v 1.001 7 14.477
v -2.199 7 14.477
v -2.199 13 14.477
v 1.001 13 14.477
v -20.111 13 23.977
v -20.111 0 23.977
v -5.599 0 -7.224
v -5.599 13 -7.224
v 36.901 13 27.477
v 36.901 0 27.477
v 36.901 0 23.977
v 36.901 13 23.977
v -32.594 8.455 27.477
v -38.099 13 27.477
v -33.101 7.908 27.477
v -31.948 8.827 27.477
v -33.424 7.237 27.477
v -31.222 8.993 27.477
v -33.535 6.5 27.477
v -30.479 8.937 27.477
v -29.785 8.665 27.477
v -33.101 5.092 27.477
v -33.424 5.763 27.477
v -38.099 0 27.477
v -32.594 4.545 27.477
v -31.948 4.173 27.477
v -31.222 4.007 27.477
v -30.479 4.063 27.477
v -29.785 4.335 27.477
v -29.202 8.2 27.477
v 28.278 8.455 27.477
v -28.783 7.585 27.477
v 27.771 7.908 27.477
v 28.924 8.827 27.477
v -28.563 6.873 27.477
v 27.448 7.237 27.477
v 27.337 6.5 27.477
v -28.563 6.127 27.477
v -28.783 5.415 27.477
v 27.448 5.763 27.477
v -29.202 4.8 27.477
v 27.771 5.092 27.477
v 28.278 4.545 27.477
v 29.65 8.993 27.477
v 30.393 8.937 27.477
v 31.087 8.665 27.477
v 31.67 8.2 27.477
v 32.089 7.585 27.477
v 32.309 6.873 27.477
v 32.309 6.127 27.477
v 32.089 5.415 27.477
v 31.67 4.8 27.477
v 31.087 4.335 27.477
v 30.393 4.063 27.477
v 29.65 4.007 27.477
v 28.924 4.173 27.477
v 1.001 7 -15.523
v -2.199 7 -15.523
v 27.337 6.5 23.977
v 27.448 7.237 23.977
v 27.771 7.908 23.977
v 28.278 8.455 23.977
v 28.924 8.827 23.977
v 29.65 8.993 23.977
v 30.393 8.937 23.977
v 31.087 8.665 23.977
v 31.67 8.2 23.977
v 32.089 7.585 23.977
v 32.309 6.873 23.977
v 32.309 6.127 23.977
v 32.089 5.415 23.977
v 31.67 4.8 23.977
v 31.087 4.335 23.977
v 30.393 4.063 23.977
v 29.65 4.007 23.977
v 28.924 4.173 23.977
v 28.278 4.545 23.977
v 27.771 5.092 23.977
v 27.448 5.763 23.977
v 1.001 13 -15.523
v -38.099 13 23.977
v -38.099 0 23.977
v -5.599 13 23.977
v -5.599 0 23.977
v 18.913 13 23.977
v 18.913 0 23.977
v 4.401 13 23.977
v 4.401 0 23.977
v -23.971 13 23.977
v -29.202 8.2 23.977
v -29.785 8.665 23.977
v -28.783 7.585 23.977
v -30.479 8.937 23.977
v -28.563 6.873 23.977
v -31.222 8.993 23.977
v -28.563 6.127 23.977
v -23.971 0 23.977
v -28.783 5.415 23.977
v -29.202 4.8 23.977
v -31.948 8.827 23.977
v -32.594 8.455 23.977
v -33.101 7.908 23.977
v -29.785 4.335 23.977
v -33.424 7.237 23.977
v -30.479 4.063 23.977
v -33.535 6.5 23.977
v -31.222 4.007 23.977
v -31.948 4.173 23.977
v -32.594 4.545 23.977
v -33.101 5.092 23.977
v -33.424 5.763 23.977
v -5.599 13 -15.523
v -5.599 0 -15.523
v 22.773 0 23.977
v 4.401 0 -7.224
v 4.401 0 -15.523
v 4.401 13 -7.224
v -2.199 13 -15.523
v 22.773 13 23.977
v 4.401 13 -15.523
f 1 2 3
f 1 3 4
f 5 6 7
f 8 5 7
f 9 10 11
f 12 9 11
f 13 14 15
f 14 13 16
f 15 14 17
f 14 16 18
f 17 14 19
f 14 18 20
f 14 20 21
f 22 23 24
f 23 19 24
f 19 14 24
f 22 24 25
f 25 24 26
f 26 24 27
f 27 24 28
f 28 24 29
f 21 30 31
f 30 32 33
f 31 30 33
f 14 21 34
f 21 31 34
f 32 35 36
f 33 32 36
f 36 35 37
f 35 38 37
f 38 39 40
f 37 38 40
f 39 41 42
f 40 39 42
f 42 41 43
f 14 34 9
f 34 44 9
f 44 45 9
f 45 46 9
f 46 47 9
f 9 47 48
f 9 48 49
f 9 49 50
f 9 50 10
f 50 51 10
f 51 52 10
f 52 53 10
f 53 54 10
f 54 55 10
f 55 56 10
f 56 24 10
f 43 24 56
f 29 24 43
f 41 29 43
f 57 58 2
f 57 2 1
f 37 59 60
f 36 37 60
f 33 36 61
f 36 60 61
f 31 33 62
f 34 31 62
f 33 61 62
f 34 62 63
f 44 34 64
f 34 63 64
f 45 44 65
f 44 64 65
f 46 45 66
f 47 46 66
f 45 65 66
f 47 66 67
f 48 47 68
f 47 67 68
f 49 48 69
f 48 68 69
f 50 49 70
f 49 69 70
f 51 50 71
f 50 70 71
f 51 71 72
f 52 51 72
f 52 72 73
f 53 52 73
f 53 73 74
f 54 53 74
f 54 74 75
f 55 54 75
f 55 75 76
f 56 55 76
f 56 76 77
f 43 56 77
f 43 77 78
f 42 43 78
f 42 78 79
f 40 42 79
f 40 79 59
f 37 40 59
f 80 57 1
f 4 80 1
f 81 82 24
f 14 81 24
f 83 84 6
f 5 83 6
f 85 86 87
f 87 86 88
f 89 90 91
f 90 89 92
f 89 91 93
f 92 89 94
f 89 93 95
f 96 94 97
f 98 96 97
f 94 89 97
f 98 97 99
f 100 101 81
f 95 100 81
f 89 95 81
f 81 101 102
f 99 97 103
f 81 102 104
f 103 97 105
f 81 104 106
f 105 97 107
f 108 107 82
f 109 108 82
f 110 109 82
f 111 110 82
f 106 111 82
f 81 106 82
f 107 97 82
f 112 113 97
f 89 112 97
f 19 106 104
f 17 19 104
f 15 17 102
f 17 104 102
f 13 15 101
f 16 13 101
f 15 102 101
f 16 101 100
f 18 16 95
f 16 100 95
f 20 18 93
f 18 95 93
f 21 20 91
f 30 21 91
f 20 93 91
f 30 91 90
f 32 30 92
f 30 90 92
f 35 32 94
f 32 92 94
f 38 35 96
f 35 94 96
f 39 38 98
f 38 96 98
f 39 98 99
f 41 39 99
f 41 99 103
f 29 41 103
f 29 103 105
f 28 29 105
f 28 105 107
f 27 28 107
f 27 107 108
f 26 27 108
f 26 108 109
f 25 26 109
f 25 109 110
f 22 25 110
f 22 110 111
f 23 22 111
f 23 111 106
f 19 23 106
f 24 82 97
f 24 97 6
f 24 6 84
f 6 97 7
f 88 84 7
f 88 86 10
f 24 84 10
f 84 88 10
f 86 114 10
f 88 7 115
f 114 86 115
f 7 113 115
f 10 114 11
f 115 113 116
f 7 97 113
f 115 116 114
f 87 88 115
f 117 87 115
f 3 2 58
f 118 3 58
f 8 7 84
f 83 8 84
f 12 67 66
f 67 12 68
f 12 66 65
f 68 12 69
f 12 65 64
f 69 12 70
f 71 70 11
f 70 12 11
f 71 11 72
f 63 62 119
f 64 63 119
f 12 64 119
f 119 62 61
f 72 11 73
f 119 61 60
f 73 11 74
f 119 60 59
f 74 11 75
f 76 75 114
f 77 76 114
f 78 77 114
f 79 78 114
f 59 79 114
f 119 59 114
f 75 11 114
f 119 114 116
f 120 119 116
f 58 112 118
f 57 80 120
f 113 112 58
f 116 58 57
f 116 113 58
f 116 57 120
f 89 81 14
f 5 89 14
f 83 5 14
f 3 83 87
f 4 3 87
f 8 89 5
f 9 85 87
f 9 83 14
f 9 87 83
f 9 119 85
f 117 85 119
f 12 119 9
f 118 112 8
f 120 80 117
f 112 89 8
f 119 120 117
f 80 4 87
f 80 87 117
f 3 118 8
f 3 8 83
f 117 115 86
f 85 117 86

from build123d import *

# Parameters (mm, degrees)
BOSS_EXTRUDE1_DEPTH = 13
SKETCH1_6_W         = 3.2
SKETCH1_6_H         = 30
BOSS_EXTRUDE2_DEPTH = 7
SKETCH2_R           = 2.5
CUT_EXTRUDE1_DEPTH  = 7


with BuildPart() as part:
    # Sketch1 → Boss-Extrude1 (new body)
    with BuildSketch(Plane(origin=(0, 0, 0), x_dir=(1, 0, 0), z_dir=(0, 1, 0))):
        Polygon((36.900921659, -27.476958525), (36.900921659, -23.976958525), (22.773014682, -23.976958525), (4.400921659, 15.523041475), (1.000921659, 15.523041475), (1.000921659, -14.476958525), (-2.199078341, -14.476958525), (-2.199078341, 15.523041475), (-5.599078341, 15.523041475), (-23.971171364, -23.976958525), (-38.099078341, -23.976958525), (-38.099078341, -27.476958525), align=None)
        Polygon((-5.599078341, -23.976958525), (-20.111109043, -23.976958525), (-5.599078341, 7.223907484), align=None, mode=Mode.SUBTRACT)
        Polygon((4.400921659, -23.976958525), (4.400921659, 7.223907484), (18.912952361, -23.976958525), align=None, mode=Mode.SUBTRACT)
    extrude(amount=BOSS_EXTRUDE1_DEPTH)

    # Sketch1<6> → Boss-Extrude2 (add)
    with BuildSketch(Plane(origin=(0, 0, 0), x_dir=(1, 0, 0), z_dir=(0, 1, 0))):
        with Locations((-0.599078341, 0.523041475)):
            Rectangle(SKETCH1_6_W, SKETCH1_6_H)
    extrude(amount=BOSS_EXTRUDE2_DEPTH)

    # Sketch2 → Cut-Extrude1 (cut)
    with BuildSketch(Plane(origin=(0, 0, 23.976958525), x_dir=(-1, 0, 0), z_dir=(0, 0, -1))):
        with Locations((31.035124853, 6.5)):
            Circle(SKETCH2_R)
        with Locations((-29.836968171, 6.5)):
            Circle(SKETCH2_R)
    extrude(amount=-CUT_EXTRUDE1_DEPTH, mode=Mode.SUBTRACT)


solid = part.part
